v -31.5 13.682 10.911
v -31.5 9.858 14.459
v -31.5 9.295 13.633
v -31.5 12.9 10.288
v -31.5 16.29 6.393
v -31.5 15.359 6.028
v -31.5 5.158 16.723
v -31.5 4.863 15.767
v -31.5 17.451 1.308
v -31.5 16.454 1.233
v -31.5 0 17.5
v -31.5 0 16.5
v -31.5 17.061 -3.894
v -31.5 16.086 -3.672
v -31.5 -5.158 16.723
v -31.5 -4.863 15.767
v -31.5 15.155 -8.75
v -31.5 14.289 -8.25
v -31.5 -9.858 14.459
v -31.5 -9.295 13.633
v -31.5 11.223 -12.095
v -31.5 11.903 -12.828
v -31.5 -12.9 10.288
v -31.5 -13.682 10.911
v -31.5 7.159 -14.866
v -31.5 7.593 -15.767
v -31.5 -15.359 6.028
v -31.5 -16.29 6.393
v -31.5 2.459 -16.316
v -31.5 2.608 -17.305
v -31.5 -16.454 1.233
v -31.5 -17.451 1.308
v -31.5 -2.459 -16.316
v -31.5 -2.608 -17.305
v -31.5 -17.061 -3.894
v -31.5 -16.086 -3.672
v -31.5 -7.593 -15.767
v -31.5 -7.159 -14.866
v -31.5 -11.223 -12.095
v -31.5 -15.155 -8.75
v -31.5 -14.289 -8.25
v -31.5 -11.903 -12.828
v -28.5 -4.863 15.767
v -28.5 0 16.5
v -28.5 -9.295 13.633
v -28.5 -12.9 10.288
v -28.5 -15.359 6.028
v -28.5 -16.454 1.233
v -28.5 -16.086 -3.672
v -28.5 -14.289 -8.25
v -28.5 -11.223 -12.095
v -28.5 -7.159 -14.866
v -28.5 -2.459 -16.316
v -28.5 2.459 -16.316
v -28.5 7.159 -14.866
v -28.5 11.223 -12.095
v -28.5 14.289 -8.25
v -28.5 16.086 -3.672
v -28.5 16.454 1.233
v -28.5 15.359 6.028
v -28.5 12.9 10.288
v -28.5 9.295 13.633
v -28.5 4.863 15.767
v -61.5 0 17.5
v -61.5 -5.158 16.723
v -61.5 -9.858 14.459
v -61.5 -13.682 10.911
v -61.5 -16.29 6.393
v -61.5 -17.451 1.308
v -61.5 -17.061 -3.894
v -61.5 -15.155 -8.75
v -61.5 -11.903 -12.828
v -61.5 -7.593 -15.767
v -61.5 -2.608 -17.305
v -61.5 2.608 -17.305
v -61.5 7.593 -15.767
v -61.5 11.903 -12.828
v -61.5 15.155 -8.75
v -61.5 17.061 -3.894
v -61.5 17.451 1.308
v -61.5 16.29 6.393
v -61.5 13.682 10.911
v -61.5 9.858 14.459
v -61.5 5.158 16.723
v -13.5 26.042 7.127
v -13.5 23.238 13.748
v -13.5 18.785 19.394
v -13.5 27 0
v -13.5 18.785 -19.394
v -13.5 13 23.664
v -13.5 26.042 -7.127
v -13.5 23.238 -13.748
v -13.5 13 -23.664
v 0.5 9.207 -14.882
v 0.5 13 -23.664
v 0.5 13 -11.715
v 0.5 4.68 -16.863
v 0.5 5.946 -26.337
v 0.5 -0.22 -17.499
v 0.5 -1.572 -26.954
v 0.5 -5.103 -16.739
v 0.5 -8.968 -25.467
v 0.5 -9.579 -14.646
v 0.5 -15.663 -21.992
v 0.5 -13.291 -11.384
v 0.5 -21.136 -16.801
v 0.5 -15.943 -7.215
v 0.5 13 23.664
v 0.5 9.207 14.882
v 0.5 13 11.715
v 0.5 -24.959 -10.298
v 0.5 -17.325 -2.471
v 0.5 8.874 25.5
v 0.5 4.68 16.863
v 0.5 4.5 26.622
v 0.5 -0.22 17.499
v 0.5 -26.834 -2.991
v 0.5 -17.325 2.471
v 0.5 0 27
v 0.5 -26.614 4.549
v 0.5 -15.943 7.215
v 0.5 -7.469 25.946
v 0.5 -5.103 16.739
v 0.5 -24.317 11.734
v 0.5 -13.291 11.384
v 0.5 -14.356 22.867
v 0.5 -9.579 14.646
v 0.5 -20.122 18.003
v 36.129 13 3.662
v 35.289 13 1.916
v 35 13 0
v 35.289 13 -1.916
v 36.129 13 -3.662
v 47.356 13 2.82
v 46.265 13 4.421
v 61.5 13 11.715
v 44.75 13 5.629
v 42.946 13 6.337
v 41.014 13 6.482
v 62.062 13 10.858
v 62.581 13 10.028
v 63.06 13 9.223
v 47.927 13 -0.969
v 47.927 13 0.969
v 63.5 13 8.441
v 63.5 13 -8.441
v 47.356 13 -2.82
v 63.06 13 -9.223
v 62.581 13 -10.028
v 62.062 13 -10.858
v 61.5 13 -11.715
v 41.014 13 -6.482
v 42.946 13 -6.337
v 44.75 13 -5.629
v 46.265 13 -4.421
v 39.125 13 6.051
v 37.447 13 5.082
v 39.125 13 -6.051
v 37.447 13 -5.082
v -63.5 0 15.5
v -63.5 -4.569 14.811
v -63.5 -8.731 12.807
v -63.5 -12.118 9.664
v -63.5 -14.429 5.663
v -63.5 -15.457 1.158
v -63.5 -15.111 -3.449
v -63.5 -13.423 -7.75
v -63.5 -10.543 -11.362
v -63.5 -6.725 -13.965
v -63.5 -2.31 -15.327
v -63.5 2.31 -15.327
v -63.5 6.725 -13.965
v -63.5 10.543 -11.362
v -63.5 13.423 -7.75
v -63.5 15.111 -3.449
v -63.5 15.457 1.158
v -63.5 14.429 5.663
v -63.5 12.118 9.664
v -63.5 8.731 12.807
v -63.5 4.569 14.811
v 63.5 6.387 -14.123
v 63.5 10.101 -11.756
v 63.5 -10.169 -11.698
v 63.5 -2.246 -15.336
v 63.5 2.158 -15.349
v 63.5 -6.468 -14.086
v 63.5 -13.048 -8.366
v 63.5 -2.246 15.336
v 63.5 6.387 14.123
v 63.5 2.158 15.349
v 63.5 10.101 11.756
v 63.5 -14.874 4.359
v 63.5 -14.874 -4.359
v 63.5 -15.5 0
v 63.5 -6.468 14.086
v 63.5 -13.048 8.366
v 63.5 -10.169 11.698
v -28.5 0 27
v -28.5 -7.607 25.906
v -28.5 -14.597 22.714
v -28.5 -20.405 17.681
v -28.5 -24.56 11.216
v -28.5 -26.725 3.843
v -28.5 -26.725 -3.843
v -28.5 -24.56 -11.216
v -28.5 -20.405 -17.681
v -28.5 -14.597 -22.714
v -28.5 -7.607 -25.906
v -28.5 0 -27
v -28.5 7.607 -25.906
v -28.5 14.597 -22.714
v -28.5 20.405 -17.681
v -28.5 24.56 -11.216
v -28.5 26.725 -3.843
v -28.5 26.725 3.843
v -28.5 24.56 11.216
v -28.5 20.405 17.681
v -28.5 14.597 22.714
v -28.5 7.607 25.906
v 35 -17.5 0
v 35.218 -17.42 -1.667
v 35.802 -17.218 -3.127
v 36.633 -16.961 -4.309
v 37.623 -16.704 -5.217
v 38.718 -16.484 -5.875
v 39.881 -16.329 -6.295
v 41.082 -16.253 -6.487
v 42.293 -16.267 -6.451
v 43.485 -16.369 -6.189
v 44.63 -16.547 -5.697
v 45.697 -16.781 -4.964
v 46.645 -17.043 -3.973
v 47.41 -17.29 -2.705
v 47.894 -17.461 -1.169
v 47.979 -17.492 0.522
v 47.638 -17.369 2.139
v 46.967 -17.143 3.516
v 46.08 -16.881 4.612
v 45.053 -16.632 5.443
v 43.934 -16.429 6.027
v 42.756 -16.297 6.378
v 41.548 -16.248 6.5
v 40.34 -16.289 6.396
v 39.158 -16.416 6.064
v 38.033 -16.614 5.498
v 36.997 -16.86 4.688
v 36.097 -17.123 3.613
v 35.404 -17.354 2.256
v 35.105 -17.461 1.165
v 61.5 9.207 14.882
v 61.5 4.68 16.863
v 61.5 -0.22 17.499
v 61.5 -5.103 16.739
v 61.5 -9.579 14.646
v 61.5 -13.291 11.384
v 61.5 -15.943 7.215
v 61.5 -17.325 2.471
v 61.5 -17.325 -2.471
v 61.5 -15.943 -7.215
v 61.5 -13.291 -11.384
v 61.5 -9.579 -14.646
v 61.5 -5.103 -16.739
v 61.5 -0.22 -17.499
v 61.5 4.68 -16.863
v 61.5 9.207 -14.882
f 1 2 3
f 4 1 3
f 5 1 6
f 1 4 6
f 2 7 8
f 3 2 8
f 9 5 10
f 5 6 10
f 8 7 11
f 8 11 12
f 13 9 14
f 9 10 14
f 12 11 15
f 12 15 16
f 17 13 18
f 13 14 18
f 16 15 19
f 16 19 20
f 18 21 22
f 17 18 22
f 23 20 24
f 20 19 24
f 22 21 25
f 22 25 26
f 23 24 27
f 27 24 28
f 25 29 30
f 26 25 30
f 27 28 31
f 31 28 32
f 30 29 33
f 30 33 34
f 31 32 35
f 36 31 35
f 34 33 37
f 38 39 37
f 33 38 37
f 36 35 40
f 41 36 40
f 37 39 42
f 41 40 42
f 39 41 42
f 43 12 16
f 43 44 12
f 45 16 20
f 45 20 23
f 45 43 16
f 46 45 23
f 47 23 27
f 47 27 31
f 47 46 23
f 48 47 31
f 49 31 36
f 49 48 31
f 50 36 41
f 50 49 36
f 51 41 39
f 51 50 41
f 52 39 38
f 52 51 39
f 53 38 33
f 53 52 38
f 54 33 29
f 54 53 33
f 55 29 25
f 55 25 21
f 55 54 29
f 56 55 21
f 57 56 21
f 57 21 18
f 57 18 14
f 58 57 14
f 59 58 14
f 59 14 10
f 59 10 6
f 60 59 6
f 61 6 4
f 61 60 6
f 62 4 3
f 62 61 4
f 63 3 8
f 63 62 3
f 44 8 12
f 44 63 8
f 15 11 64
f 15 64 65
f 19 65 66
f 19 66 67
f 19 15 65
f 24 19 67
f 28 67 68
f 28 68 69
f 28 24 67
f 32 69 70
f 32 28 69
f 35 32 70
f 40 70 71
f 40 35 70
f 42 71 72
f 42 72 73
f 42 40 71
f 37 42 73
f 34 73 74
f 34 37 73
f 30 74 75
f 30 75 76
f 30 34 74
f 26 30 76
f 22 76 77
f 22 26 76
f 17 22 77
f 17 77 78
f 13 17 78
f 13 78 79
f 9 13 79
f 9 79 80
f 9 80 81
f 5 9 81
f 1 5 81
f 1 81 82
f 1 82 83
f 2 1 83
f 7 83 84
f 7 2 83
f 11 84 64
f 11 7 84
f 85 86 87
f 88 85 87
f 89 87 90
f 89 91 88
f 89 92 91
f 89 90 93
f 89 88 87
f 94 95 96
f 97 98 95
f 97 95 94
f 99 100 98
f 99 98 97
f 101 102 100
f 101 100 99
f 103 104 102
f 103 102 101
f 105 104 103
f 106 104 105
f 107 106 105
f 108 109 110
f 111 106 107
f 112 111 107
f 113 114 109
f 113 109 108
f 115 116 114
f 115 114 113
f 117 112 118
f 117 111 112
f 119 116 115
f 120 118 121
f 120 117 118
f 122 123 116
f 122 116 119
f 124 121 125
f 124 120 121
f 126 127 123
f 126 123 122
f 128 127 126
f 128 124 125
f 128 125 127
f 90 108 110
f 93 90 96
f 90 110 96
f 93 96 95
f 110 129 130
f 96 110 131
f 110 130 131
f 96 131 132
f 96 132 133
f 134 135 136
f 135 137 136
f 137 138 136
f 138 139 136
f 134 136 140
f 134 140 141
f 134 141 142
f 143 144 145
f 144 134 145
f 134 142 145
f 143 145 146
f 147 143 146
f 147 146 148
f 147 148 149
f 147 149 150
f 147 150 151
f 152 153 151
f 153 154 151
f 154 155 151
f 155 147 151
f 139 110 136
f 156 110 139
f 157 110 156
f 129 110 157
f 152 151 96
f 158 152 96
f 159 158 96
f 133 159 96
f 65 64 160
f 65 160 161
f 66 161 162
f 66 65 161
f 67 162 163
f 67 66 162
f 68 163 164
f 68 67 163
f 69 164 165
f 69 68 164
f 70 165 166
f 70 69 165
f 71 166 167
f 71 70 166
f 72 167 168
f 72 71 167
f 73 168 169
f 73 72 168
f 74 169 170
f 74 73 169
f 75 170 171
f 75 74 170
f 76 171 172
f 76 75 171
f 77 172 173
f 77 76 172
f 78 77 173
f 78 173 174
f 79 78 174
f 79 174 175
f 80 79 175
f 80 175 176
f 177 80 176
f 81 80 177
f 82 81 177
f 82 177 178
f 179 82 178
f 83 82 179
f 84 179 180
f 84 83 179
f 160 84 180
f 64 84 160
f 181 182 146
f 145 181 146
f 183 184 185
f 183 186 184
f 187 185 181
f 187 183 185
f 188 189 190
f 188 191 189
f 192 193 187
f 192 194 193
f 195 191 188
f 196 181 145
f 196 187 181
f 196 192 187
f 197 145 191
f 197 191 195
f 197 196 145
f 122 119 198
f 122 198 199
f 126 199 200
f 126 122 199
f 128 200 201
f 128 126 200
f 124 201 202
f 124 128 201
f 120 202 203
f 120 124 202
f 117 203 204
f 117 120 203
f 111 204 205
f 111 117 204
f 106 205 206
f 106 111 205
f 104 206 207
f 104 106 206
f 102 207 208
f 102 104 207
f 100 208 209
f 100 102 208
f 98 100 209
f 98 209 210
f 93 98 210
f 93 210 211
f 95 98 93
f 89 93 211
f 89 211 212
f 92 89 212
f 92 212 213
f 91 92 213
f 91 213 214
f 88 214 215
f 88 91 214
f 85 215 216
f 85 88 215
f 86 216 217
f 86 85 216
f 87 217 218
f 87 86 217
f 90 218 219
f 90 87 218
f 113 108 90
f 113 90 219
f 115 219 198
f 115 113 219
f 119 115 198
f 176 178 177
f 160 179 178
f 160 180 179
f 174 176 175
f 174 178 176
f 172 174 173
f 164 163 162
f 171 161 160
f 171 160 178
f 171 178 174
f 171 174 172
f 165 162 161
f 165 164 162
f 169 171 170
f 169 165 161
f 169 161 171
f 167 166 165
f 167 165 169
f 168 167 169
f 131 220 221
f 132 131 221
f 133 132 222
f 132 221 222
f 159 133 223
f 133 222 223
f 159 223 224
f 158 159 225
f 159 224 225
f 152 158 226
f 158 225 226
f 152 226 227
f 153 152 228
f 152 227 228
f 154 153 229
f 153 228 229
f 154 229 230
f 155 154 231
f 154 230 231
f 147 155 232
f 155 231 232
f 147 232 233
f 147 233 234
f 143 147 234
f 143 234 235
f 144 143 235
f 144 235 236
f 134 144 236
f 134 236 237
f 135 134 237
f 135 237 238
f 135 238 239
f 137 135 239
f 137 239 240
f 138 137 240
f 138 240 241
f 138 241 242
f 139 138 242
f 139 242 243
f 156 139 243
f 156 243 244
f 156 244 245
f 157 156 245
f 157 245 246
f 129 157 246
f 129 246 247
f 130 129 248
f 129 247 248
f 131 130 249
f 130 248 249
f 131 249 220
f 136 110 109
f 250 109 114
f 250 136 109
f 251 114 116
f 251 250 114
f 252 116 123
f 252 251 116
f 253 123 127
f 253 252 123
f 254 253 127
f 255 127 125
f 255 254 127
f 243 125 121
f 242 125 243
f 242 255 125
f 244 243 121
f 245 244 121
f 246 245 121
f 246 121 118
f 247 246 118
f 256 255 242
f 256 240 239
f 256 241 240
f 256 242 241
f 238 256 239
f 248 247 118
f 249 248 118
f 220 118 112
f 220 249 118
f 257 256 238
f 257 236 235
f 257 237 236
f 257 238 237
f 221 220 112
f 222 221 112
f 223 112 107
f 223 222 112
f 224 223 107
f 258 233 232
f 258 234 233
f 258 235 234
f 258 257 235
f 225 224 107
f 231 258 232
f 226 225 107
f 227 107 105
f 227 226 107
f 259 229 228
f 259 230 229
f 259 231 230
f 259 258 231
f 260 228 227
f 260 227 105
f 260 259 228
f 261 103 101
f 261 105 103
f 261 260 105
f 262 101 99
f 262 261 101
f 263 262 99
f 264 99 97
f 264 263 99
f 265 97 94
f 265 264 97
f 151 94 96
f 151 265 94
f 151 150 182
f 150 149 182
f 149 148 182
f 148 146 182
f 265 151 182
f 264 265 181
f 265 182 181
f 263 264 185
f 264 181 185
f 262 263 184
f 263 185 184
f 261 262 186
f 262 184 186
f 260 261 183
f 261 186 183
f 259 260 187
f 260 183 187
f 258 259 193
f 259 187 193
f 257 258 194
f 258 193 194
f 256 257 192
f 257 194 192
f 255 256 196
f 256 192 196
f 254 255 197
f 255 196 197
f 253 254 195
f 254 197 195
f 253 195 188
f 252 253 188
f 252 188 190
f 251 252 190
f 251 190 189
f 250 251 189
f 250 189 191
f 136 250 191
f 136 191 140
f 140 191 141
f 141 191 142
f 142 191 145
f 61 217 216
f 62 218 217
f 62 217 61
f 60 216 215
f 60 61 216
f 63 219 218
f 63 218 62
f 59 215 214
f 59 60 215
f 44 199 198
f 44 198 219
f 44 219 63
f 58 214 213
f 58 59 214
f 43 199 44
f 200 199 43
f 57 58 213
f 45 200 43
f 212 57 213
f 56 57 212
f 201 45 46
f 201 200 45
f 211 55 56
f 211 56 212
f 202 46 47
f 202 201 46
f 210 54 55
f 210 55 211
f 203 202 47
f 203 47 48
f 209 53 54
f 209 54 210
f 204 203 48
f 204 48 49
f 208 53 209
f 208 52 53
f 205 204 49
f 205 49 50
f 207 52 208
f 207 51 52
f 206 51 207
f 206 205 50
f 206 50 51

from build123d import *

# Parameters (mm, degrees)
SKETCH4_W                      = 3
SKETCH4_H                      = 1
SKETCH5_W                      = 47.328638264
SKETCH5_H                      = 14
CUT_EXTRUDE1_DEPTH             = 77
F_1_2_0_51181102_DOWEL_HOLE1_D = 12.999999908
CHAMFER1_SIZE                  = 2


with BuildPart() as part:
    # Sketch2 → Revolve1 (revolve)
    with BuildSketch(Plane.XY, mode=Mode.PRIVATE) as revolve1_sk:
        Polygon((-63.5, 0), (-63.5, 17.5), (-28.5, 17.5), (-28.5, 27), (0.5, 27), (0.5, 17.5), (63.5, 17.5), (63.5, 0), align=None)
    revolve(revolve1_sk.sketch.rotate(Axis((-63.5, 0, 0), (1, 0, 0)), 90), axis=Axis((-63.5, 0, 0), (1, 0, 0)))

    # Sketch4 → Cut-Revolve1 (revolve, cut)
    with BuildSketch(Plane.XY, mode=Mode.PRIVATE) as cut_revolve1_sk:
        with Locations((-30, 17)):
            Rectangle(SKETCH4_W, SKETCH4_H)
    revolve(cut_revolve1_sk.sketch.rotate(Axis((-63.5, 0, 0), (1, 0, 0)), 90), axis=Axis((-63.5, 0, 0), (1, 0, 0)), mode=Mode.SUBTRACT)

    # Sketch5 → Cut-Extrude1 (cut)
    with BuildSketch(Plane(origin=(63.5, 0, 0), x_dir=(0, 0, -1), z_dir=(1, 0, 0))):
        with Locations((0, 20)):
            Rectangle(SKETCH5_W, SKETCH5_H)
    extrude(amount=-CUT_EXTRUDE1_DEPTH, mode=Mode.SUBTRACT)

    # 1/2 (0.51181102) Dowel Hole1 (through all)
    with Locations(Plane(origin=(0, 13, 0), x_dir=(1, 0, 0), z_dir=(0, 1, 0))):
        with Locations((41.5, 0)):
            Hole(F_1_2_0_51181102_DOWEL_HOLE1_D / 2)

    # Chamfer1
    chamfer1_edges = [part.edges().sort_by_distance(p)[0] for p in [
        (63.5, -17.5, 0),
        (-63.5, 0, -17.5),
    ]]
    chamfer(chamfer1_edges, length=CHAMFER1_SIZE)


solid = part.part
